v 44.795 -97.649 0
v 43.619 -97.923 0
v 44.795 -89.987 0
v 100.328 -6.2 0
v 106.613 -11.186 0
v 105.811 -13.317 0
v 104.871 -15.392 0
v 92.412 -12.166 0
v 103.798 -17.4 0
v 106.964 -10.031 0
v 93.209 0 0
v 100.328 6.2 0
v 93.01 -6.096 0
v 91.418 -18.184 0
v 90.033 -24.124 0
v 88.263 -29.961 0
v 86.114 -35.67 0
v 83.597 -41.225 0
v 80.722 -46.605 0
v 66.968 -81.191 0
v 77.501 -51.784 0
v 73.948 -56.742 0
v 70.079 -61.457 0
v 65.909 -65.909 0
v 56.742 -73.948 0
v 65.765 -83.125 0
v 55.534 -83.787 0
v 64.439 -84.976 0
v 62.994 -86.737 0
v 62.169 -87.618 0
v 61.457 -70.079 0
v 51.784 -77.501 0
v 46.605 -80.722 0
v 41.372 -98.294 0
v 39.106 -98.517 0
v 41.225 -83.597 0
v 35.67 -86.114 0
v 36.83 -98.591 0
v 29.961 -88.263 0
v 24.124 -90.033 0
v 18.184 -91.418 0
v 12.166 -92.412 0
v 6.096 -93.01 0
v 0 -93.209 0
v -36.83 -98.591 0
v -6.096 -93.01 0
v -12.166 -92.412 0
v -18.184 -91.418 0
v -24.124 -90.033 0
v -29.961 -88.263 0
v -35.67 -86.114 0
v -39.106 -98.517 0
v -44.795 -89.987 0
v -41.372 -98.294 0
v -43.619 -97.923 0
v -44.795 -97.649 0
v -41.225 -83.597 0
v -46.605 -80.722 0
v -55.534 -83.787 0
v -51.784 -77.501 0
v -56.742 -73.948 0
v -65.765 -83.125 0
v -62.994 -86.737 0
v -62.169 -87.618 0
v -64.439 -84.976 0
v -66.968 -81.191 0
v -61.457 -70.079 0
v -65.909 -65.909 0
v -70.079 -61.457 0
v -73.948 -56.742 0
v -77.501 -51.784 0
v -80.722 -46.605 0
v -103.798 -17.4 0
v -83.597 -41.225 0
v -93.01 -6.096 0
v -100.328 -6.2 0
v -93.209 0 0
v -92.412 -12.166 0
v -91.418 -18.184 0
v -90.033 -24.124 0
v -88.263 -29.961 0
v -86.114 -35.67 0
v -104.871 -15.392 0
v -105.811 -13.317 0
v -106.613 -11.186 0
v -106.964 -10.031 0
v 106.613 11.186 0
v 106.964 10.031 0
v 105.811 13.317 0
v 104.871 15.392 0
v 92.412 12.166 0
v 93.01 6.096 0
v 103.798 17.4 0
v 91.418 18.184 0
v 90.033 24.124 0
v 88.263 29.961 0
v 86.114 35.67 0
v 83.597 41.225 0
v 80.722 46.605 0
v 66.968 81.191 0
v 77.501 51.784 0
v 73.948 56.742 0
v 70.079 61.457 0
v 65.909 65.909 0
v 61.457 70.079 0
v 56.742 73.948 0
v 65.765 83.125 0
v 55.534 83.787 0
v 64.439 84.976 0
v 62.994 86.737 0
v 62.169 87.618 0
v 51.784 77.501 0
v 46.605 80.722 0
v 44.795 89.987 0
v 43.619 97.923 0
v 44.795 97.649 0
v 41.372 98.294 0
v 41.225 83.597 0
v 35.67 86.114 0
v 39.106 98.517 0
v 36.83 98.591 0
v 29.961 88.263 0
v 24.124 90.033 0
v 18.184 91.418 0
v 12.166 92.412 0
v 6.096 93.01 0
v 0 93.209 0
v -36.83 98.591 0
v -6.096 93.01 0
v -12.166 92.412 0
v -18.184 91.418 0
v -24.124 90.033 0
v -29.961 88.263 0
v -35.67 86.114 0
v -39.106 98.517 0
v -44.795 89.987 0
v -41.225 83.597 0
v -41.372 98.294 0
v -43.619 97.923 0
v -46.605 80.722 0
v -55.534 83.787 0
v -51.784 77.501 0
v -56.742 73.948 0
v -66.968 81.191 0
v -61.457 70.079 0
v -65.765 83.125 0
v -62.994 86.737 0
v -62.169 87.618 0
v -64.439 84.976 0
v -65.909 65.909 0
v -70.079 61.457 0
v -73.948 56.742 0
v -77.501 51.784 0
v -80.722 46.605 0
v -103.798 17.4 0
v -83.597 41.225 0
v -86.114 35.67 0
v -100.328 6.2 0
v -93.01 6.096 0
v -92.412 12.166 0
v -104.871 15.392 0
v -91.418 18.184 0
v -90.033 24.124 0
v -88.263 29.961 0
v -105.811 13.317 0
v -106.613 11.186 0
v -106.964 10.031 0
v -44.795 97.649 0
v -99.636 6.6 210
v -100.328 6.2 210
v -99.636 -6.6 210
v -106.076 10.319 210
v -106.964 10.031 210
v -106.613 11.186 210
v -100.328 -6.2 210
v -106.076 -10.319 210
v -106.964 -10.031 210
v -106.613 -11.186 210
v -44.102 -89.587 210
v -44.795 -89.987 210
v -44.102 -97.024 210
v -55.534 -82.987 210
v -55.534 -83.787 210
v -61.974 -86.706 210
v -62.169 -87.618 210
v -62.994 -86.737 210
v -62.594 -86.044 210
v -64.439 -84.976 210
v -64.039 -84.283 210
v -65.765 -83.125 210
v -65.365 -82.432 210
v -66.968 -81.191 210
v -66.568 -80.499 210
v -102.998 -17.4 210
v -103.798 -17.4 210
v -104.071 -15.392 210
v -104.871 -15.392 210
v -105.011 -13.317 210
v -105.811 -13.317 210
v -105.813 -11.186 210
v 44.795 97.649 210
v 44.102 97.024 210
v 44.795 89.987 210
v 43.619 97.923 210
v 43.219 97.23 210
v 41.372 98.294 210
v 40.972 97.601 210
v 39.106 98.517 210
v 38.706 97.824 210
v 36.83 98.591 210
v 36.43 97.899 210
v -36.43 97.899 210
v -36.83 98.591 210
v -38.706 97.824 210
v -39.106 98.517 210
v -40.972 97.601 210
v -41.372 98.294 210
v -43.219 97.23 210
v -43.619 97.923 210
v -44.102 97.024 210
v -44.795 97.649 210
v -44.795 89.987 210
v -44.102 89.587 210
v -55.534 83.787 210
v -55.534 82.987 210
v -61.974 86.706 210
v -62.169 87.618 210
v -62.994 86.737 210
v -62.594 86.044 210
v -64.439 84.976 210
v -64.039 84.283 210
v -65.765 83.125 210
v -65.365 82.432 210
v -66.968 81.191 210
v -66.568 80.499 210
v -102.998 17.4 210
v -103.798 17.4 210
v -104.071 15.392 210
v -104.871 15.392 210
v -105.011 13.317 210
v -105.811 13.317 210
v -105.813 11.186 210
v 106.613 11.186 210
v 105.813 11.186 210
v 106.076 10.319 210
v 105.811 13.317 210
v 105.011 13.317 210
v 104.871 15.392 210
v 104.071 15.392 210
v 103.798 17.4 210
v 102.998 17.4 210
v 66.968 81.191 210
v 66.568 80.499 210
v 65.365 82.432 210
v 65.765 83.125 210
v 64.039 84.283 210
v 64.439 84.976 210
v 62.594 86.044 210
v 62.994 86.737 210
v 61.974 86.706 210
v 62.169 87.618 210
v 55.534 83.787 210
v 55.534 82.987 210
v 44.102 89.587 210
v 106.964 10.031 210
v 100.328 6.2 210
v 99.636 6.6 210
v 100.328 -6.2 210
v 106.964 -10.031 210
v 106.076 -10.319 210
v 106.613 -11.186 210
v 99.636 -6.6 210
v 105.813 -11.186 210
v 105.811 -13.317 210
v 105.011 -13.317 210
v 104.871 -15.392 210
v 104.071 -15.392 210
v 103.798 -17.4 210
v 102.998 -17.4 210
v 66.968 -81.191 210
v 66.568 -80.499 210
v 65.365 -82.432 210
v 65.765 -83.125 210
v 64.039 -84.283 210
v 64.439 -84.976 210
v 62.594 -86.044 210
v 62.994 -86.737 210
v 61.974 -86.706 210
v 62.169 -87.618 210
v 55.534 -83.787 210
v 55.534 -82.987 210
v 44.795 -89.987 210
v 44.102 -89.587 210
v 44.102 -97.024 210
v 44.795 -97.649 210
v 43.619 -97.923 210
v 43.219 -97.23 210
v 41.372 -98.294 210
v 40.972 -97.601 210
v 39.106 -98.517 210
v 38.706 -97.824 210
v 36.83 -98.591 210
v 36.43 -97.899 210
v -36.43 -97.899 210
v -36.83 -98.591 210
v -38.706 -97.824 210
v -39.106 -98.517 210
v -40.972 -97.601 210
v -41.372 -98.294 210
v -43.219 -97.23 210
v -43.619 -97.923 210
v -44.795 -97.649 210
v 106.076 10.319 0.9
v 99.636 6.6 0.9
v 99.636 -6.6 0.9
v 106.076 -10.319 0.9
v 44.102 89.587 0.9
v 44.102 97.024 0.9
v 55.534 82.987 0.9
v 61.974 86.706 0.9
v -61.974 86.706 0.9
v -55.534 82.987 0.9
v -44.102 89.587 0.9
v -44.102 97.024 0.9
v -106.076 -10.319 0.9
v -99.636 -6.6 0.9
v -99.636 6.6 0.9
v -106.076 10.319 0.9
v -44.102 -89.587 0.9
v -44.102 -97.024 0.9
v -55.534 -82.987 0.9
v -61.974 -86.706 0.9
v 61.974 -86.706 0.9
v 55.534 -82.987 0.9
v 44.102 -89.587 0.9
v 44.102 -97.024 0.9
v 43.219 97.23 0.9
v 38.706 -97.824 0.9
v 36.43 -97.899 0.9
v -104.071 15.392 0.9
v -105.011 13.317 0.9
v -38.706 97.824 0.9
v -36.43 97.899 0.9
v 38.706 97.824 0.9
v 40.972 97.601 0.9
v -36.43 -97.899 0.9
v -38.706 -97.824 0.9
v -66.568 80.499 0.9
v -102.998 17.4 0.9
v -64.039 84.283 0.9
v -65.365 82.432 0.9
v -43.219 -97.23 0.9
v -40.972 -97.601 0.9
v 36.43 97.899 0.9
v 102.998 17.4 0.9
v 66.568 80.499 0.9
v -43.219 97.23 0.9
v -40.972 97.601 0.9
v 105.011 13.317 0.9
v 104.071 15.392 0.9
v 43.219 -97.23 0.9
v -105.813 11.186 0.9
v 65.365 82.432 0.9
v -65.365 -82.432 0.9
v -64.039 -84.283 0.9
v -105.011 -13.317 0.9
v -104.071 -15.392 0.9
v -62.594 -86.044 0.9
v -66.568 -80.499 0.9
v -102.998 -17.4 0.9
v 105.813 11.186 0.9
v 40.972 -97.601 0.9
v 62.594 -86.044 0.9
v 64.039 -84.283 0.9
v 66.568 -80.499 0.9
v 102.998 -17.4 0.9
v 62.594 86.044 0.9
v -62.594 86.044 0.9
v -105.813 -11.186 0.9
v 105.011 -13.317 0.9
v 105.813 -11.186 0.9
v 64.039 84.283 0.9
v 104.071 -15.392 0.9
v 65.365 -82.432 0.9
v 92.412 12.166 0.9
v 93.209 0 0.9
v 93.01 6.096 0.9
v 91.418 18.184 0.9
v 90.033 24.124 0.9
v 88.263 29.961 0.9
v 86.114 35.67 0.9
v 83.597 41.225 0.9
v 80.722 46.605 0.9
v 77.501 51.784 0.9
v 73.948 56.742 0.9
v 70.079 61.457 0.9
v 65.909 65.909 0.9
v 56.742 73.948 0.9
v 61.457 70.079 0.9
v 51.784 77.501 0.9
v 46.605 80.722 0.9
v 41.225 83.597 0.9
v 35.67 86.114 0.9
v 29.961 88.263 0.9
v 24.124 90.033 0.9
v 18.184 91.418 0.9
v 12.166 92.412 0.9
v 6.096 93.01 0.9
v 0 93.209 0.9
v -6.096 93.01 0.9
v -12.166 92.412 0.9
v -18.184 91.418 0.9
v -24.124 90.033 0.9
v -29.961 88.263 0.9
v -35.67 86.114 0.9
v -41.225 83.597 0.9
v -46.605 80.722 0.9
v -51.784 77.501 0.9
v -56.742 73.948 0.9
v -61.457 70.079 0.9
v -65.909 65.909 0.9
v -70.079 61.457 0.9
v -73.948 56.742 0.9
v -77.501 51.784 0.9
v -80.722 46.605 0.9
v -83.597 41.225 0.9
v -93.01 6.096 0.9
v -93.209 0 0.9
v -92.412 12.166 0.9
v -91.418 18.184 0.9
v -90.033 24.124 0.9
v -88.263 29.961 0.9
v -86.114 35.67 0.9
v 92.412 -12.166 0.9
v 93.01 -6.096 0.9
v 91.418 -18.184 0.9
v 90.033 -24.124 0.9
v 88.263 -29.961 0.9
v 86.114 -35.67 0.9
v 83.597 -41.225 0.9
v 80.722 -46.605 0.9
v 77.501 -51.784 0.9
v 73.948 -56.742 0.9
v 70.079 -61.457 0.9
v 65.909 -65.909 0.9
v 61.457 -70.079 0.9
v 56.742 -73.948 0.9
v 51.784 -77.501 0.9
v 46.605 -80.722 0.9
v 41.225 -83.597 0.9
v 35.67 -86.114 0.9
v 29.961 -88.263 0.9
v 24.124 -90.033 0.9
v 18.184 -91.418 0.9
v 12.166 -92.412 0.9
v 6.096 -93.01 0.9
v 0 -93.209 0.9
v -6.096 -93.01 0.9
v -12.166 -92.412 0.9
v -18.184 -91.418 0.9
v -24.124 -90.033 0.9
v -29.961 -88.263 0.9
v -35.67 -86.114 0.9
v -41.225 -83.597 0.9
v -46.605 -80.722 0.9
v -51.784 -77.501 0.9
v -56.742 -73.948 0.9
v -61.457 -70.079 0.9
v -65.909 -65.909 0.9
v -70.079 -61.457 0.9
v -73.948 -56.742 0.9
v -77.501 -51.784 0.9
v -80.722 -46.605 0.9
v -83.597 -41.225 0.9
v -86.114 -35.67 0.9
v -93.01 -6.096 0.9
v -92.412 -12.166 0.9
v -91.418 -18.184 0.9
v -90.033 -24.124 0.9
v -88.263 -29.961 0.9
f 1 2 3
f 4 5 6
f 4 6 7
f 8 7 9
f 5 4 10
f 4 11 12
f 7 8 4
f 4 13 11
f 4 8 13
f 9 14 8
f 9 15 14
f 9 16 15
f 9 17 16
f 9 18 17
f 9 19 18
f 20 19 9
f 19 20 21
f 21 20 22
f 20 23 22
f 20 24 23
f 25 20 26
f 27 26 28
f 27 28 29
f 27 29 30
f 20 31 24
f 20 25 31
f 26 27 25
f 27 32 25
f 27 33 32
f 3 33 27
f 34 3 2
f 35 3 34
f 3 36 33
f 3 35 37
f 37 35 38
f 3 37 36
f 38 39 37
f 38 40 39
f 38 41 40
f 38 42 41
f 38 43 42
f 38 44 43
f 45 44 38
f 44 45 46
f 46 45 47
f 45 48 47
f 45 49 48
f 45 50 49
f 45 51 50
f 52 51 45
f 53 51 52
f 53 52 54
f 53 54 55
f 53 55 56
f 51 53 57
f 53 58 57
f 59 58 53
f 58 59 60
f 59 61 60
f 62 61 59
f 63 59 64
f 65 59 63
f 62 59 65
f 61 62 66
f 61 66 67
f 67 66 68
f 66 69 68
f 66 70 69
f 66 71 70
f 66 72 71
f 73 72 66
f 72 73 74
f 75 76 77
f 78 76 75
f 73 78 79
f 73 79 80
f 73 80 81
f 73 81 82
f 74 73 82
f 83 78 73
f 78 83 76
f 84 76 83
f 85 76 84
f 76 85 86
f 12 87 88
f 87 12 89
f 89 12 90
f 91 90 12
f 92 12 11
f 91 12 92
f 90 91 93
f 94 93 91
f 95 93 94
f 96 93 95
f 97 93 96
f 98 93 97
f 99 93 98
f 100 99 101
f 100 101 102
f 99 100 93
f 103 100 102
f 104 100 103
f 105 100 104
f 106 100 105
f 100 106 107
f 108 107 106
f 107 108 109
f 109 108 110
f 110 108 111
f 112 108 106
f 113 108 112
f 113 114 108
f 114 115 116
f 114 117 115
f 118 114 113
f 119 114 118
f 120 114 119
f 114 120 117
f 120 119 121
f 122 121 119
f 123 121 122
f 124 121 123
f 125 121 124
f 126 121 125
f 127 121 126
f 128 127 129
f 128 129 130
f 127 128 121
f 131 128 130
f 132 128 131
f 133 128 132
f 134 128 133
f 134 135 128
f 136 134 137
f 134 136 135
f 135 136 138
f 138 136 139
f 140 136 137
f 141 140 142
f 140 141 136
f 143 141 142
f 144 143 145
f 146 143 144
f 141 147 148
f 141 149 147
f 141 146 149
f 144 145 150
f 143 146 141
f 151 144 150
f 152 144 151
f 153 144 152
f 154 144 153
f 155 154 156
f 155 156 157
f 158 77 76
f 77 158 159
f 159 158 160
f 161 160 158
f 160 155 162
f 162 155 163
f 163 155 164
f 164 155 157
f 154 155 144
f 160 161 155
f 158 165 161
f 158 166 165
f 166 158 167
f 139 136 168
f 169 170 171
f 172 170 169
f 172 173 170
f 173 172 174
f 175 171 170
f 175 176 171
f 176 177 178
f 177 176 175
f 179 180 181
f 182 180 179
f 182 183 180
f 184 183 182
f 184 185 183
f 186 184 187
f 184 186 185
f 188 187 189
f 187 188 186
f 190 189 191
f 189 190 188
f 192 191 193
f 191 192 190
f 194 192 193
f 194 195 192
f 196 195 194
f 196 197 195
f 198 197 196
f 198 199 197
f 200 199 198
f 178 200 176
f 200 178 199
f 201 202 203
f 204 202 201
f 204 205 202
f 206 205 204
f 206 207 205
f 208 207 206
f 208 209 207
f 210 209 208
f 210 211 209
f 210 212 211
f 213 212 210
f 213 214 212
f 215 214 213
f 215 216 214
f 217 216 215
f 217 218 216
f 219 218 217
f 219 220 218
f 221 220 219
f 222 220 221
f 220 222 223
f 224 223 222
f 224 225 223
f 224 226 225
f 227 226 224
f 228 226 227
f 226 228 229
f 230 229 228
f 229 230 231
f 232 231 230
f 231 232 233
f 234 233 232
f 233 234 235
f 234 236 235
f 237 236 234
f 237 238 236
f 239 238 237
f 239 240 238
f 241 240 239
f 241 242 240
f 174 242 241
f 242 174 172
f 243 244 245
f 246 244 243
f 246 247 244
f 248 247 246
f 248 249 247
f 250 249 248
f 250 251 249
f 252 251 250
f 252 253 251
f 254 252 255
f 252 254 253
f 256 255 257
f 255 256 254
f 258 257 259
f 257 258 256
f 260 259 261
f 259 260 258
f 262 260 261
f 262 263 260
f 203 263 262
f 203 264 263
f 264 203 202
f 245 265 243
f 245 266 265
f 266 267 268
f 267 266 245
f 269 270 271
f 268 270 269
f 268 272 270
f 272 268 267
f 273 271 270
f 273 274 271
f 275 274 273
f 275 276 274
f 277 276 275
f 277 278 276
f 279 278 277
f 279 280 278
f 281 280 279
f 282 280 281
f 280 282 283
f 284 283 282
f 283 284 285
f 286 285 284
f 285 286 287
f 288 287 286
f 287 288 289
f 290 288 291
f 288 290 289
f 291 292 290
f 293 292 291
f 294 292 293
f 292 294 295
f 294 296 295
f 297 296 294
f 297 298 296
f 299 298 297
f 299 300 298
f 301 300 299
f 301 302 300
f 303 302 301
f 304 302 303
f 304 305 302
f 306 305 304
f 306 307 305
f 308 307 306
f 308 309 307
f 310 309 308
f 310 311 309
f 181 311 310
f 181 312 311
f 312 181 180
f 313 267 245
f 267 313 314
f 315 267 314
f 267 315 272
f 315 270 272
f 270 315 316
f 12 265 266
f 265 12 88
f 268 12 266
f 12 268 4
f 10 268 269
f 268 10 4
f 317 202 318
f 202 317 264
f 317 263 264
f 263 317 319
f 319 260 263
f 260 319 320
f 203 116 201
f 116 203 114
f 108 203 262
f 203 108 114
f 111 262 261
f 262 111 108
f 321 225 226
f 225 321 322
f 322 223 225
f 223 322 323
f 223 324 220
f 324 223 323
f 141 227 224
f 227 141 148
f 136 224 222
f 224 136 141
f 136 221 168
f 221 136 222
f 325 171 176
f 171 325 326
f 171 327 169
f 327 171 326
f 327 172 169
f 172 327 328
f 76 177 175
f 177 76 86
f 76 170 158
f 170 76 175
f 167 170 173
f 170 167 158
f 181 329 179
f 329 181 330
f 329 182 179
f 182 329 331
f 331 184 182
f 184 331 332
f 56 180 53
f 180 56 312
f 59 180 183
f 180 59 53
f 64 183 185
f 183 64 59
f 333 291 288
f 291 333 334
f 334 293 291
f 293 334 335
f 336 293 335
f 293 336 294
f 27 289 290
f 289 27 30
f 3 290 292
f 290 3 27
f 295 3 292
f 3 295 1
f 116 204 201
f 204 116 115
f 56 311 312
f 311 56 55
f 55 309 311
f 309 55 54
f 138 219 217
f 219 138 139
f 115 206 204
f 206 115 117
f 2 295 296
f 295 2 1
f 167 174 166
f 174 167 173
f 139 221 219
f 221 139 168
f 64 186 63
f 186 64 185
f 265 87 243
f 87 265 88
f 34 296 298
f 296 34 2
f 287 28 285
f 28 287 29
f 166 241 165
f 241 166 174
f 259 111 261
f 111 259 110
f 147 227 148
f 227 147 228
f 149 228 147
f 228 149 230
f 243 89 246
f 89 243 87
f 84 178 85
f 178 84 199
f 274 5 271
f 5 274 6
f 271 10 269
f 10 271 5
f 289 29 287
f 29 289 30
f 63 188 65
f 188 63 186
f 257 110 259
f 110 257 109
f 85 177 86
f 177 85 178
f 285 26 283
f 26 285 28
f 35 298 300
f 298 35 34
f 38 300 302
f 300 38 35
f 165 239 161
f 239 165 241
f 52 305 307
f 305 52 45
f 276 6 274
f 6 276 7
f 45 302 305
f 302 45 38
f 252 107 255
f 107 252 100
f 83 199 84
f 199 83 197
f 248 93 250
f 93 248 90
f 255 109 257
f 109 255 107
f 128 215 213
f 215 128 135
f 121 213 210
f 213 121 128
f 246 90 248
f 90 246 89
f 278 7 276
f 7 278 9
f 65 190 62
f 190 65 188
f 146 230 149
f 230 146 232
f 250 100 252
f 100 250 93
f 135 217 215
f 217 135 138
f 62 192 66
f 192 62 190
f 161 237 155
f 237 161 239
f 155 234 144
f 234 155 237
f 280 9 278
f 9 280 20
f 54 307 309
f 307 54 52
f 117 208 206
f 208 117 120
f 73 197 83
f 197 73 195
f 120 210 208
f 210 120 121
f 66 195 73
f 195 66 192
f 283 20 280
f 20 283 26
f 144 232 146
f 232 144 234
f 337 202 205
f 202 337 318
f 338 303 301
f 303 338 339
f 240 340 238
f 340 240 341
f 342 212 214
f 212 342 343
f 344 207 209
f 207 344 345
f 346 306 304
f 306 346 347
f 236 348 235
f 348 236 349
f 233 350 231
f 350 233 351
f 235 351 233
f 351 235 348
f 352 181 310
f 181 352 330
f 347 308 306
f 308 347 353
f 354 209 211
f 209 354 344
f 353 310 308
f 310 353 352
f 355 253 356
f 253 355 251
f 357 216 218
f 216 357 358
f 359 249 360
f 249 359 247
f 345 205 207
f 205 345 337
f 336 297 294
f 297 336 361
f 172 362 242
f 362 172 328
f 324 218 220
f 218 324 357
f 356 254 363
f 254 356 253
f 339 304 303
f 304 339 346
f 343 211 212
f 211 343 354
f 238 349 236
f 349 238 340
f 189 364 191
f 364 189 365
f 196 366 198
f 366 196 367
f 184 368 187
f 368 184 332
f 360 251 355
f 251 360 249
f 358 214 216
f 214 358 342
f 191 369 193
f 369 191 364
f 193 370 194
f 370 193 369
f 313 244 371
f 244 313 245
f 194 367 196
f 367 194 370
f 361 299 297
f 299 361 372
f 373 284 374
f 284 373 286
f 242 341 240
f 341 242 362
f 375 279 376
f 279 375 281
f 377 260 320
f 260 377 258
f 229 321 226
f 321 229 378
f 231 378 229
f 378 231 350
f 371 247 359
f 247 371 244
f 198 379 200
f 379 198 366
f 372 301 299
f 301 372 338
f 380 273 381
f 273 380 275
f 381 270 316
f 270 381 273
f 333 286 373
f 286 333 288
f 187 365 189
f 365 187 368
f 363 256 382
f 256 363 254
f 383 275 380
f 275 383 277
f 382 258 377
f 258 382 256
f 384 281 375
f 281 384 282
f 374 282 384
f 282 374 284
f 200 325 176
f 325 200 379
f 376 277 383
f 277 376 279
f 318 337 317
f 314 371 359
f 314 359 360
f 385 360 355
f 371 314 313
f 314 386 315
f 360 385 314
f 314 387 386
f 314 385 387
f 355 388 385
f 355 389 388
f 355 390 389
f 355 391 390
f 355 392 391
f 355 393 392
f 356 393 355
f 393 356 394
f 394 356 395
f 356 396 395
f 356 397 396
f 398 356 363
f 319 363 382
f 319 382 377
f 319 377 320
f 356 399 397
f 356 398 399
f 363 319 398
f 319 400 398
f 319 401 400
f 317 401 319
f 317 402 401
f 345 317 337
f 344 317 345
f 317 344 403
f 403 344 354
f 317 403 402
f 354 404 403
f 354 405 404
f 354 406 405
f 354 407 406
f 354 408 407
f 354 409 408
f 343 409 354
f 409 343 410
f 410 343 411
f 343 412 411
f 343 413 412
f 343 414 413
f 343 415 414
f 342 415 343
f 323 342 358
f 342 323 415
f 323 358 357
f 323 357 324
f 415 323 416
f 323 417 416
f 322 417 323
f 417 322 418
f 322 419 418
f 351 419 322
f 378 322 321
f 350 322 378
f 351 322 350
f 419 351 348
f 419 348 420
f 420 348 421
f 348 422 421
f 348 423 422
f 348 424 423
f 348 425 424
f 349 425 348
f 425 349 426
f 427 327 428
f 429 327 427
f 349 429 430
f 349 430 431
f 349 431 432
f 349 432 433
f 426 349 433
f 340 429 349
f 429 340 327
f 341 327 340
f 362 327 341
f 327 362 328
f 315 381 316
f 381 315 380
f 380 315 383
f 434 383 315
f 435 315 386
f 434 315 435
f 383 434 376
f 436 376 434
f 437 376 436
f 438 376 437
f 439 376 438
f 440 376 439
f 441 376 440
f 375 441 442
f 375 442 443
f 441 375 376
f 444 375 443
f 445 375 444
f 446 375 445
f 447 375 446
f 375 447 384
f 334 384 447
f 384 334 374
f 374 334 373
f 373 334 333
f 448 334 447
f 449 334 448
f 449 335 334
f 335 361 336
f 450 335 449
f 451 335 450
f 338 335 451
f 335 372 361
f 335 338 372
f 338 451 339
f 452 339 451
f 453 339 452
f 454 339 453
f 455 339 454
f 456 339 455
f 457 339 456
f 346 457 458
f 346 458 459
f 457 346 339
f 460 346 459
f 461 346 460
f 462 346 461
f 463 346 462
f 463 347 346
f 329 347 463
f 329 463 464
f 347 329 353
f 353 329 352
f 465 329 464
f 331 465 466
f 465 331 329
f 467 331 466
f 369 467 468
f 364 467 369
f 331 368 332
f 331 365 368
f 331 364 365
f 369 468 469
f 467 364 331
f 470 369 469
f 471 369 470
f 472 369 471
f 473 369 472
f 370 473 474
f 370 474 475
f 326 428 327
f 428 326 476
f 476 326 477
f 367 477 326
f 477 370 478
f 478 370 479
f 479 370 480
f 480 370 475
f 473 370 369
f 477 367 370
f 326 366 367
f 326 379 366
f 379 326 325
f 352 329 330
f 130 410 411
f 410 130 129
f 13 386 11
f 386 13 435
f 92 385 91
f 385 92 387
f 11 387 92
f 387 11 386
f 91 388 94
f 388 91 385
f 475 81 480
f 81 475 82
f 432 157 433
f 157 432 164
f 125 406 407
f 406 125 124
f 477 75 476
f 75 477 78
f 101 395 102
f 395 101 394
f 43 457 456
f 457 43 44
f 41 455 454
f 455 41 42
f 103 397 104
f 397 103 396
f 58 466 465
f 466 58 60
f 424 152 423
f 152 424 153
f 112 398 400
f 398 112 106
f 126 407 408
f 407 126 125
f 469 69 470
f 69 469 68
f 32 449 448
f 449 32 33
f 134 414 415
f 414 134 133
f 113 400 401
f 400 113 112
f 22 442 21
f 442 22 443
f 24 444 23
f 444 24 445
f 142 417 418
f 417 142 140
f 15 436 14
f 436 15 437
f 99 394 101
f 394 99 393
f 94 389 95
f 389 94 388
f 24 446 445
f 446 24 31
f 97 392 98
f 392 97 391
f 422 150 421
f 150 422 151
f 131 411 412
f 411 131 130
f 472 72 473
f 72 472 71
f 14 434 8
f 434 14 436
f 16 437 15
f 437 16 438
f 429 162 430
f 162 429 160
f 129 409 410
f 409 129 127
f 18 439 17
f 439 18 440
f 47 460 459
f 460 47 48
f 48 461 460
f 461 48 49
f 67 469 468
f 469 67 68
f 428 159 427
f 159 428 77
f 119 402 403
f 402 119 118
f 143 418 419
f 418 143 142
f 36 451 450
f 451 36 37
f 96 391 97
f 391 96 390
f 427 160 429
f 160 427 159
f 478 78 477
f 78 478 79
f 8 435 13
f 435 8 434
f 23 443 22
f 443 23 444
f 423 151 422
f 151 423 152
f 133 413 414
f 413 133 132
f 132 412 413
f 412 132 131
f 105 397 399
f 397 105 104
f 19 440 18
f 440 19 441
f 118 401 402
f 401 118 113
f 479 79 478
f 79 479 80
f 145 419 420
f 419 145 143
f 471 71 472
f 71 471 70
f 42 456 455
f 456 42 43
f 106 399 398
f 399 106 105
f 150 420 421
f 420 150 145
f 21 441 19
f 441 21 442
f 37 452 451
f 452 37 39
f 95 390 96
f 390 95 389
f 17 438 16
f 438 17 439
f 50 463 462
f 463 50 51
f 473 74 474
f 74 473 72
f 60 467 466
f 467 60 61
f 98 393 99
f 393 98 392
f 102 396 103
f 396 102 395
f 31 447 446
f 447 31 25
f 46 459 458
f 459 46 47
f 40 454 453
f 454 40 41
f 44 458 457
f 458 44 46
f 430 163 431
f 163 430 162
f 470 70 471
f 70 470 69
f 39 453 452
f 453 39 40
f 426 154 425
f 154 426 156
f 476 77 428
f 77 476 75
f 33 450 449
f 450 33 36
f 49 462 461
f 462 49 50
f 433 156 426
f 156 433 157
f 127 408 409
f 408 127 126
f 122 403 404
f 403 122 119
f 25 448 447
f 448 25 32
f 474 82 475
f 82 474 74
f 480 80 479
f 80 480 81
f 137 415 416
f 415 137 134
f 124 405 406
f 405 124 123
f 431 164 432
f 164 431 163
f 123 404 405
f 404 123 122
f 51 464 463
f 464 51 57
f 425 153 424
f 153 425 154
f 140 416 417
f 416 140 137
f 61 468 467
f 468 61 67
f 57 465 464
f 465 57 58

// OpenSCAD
// file: printer-params.scad
d_nozzle = 0.8;
h_layer = 0.15;
z_limit = 210;
y_limit = 210;
// file: helper-functions.scad
// mirrors object and retains copy of original object
module mirror_copy() {
    children(); // Original object
    mirror(v) children(); // Mirrored object
}

// isometric grid for drain mesh
// implemented as 3x rectilinear grid patterns stacked on top of each other and rotated 60 degrees apart
module isometric_grid_generator(r=30, w=0.8, h_layer=0.2, h_bottom_shell=3*0.2, n=6, d_hole=1.2) {
    n_bottom_shell = h_bottom_shell/h_layer;
    rotate([0, 0, 30])
    for (i = [0:1:n_bottom_shell-1]) {
        translate([0, 0, i*h_layer])
        rotate([0, 0, i*60])
        rectilinear_grid_generator(r=r, w=w, h=h_layer, n=n, d_hole=d_hole);
    }
}

// used for generating isometric grid
module rectilinear_grid_generator(r=30, w=0.8, h=0.2, n=3, d_hole=1.2) {
    difference() {
        rotate([0, 0, 90])
        cylinder(h, r=r, $fn=n);
        mirror_copy()
        for (i = [0: w+d_hole: 2*r]) {
            translate([i, 0, h/2])
            cube([d_hole, 2*r, h], center=true);
        }
    }
}

// for generating drain mesh
module honeycomb_generator(n=5, r_hex=0.8, r_dist=1.6, h=0.2) {
    angle=60;
    for (i = [1:1:6]) {
        if (angle*i % angle == 0 && n > 0) {
            rotate([0, 0, angle*i])
            translate([0, r_dist*n, 0])
            cylinder(r=r_hex, h=h, $fn=6);
        }
        if (n % 2 == 0) {
            rotate([0, 0, angle*i])
            translate([r_dist*n*1.5/sqrt(3), 0, 0])
            cylinder(r=r_hex, h=h, $fn=6);
        }
        if (n % 2 == 0 && n > 3) {
            for (j = [-(n-2):2:(n-2)]) {
                rotate([0, 0, angle*i])
                translate([r_dist*n*1.5/sqrt(3), j*r_dist/2, 0])
                cylinder(r=r_hex, h=h, $fn=6);
            }
        }
        if (n % 2 != 0 && n > 2) {
            for (j = [-(n-2):2:(n-2)]) {
                rotate([0, 0, angle*i])
                translate([r_dist*n*1.5/sqrt(3), j*r_dist/2, 0])
                cylinder(r=r_hex, h=h, $fn=6);
            }
        }
    }
    if (n > 0) {
        honeycomb_generator(n=n-1, r_hex=r_hex, r_dist=r_dist, h=h);
    }
}

// water injection port cavity
module water_injection_port_cavity(r, h) {
    rotate([0, 0, 30])
    cylinder(r=r, h=h, $fn=6);
    for (i = [-1:2:1]) {
        rotate([0, 0, 30*i])
        translate([sqrt(3)*r/2, 0, 0])
        cylinder(r=r, h=h, $fn=6);
    }
}

// water injection port walls
module water_injection_port(r_o, r_i, h) {
    difference() {
        union() {
            rotate([0, 0, 30])
            cylinder(r=r_o, h=h, $fn=6);
            for (i = [-1:2:1]) {
                rotate([0, 0, 30*i])
                translate([sqrt(3)*r_o/4, 0, 0])
                cylinder(r=r_o, h=h, $fn=6);
            }
        }

        // water injection port cavity
        water_injection_port_cavity(r_i, h);
    }
}

// shell used to remove protruding water injection port walls
module invisible_shell(r_o, r_i, h, r_fil=0) {
    difference() {
        linear_extrude(h)
        rounding2d(r_fil)
        hexagon2d(r=r_o);

        linear_extrude(h)
        rounding2d(r_fil)
        hexagon2d(r=r_i);
    }
}

// hexagon function
module equilateraltriangle2d(r) {
    polygon(points=[[-r, 0], [0, r*sqrt(3)], [r, 0]]);
}

// hexagon function
module hexagon2d(r) {
    polygon(points=[[r, 0], [r/2, r*sqrt(3)/2], [-r/2, r*sqrt(3)/2], [-r, 0], [-r/2, -r*sqrt(3)/2], [r/2, -r*sqrt(3)/2]]);
}

//// fillet functions

// used for circular filleted cutout of outer bottom
module circular_outer_bottom_fillet(r_cyl, r_fil, h_bottom_offset, res) {
    translate([0, 0, -h_bottom_offset])
    difference() {
        cylinder(h=r_fil, r=r_cyl, $fn=res);

        // remove layers that would otherwise print steep overhangs due to fillet
        cylinder(h=h_bottom_offset, r=r_cyl);

        bottomFillet(b=0, r=r_fil, s=200)
        cylinder(h=r_fil, r=r_cyl, $fn=res);
    }
}

// based on work by https://github.com/ademuri/openscad-fillets

function filletDepth(r, d, i) = r * cos(asin(d * i / r));

module topBottomFillet(b = 0, t = 2, r = 1, s = 4, e = 1) {
    if (e == 1) {
        topFilletPeice(t = t, r = r, s = s) children(0);
        bottomFilletPeice(b = b, r = r, s = s) children(0);

        render()
        difference() {
            children(0);

            translate([0, 0, t - r])
            linear_extrude(r + 1)
            offset(delta = 1e5)
            projection()
            children(0);

            translate([0, 0, b - 1])
            linear_extrude(r + 1)
            offset(delta = 1e5)
            projection()
            children(0);

        }
    }
    if (e == 0) children(0);
}

module topFillet(t = 2, r = 1, s = 4, e = 1) {
    if (e == 1) {
        topFilletPeice(t = t, r = r, s = s) children(0);

        render()
        difference() {
            children(0);
            translate([0, 0, t-r])
            linear_extrude(r + 1)
            offset(delta = 1e5)
            projection()
            children(0);
        }
    }
    if (e == 0) children(0);
}

module bottomFillet(b = 0, r = 1, s = 4, e = 1) {
    if (e == 1) {
        bottomFilletPeice(b = b, r = r, s = s) children(0);

        render()
        difference() {
            children(0);
            translate([0, 0, b - 1])
            linear_extrude(r + 1)
            offset(delta = 1e5)
            projection()
            children(0);
        }
    }
    if (e == 0) children(0);
}

module topFilletPeice(t = 2, r = 1, s = 4) {
    d = r/s;

    for (i = [0:s]) {
        x = filletDepth(r, d, i);
        z = d * (s - i + 1);
        translate([0, 0, t - z])
        linear_extrude(d)
        offset(delta = -r + x)
        projection(true)
        translate([0, 0, -t + z])
        children(0);
    }
}

module bottomFilletPeice(b = 0, r =1, s = 4) {
    d = r/s;

    for (i = [0:s]) {
        x = filletDepth(r, d, i);
        z = d * (s - i);
        translate([0, 0, b + z])
        linear_extrude(d)
        offset(delta = -r + x)
        projection(true)
        translate([0, 0, b - z])
        children(0);
    }
}

module rounding2d(r) {
    offset(r = r) offset(delta = -r) children(0);
}
// file: design-params.scad
// printer parameters
include <printer-params.scad>

// design parameters
scale_factor = 1.0;

t_wall = d_nozzle;
t_wall_clearance = d_nozzle;

perimeter_buffer = 10;

d_buoy = (2*y_limit/sqrt(3) - perimeter_buffer)*scale_factor;
d_i_buoy = sqrt(3)*d_buoy/2;
h_buoy = z_limit*scale_factor;

d_drain_pipe = (y_limit - perimeter_buffer)*scale_factor/5;
h_drain_pipe = 2*h_buoy/3;

overhang_angle = 60;
d_buoy_cavity = d_buoy-4*t_wall;
h_conical_cavity = tan(90-overhang_angle)*(d_buoy_cavity/2-d_drain_pipe/2);
h_bottom_shell = 6*h_layer;

d_planter = d_buoy_cavity-2*t_wall_clearance;
d_planter_cavity = d_planter-2*t_wall;

d_water_injection_port_cavity_buoy = 20;
d_water_injection_port_buoy = d_water_injection_port_cavity_buoy + 4*t_wall;
x_water_injection_port = d_buoy/2-(d_water_injection_port_cavity_buoy/2)*sin(30)/sin(75);

d_drain_hole=3*d_nozzle;
r_drain_hole_dist = 3*d_drain_hole;
d_wicking_chamber_short_base = d_planter/3;

r_fillet = 1.5*d_water_injection_port_buoy*scale_factor;
h_bottom_fillet_offset = 0.05*r_fillet;
// main file
// design parameters
include <design-params.scad>
include <helper-functions.scad>

d_wicking_plate = d_buoy_cavity-2*t_wall_clearance;
d_water_injection_port_cavity_wicking_plate = d_water_injection_port_buoy;
h_planter = z_limit*scale_factor;
d_drainpipe = 4*d_nozzle;

d_water_injection_port_cavity_planter = d_water_injection_port_buoy;

d_water_injection_port_planter = d_water_injection_port_cavity_planter+2*t_wall;

d_interface_rim = d_planter_cavity - d_water_injection_port_buoy*sqrt(3)/2 - (d_water_injection_port_cavity_buoy/2)*sin(30)/sin(75) - 2*t_wall;

// Hidden variables:
res_fil = 96;
$fn = res_fil;

// water injection port walls
difference() {
    // water injection port walls
    for (i = [0:1:6]) {
        rotate([0, 0, 60*i])
        translate([x_water_injection_port, 0, 0])
        water_injection_port(r_o=d_water_injection_port_planter/2+t_wall, r_i=d_water_injection_port_cavity_planter/2+t_wall, h=h_buoy);
    }

    // shell used to remove protruding water injection port walls
    invisible_shell(r_o=d_buoy/2+d_water_injection_port_planter, r_i=d_planter/2, h=z_limit, r_fil=r_fillet);
}

// planter walls
difference() {
    linear_extrude(h_planter)
    rounding2d(r_fillet)
    hexagon2d(r=d_planter/2);

    // water injection port cavity
    for (i = [0:1:6]) {
        rotate([0, 0, 60*i])
        translate([x_water_injection_port, 0, 0])
        water_injection_port_cavity(r=d_water_injection_port_cavity_planter/2+t_wall, h=z_limit);
    }

    // hexagonal cavity
    linear_extrude(h_planter)
    rounding2d(r_fillet)
    hexagon2d(r=d_planter_cavity/2);

    // hexagonal cavity for drainpipe
    linear_extrude(h_bottom_shell)
    hexagon2d(r=d_drainpipe/2);
}

// planter brim
difference() {
    linear_extrude(h_bottom_shell)
    rounding2d(r_fillet)
    hexagon2d(r=d_planter/2);

    // water injection port cavity
    for (i = [0:1:6]) {
        rotate([0, 0, 60*i])
        translate([x_water_injection_port, 0, 0])
        water_injection_port_cavity(r=d_water_injection_port_cavity_planter/2+t_wall, h=z_limit);
    }

    // hexagonal cavity
    linear_extrude(h_planter)
    rounding2d(r_fillet)
    hexagon2d(r=d_planter_cavity/2-sqrt(3)*d_drain_hole/2);
}

// water injection port brim
difference() {
    // water injection port walls
    for (i = [0:1:6]) {
        rotate([0, 0, 60*i])
        translate([x_water_injection_port, 0, 0])
        water_injection_port(r_o=d_water_injection_port_planter/2+d_drain_hole, r_i=d_water_injection_port_cavity_planter/2+t_wall, h=h_bottom_shell);
    }

    // shell used to remove protruding water injection port walls
    invisible_shell(r_o=d_buoy/2+d_water_injection_port_planter, r_i=d_planter/2, h=z_limit, r_fil=r_fillet);
}


// drain mesh
difference() {
    // drain mesh
    linear_extrude(h_bottom_shell)
    rounding2d(r_fillet)
    hexagon2d(r=d_planter/2);

    // water injection port cavity
    for (i = [0:1:6]) {
        rotate([0, 0, 60*i])
        translate([x_water_injection_port, 0, 0])
        water_injection_port_cavity(r=d_water_injection_port_cavity_planter/2+t_wall, h=z_limit);
    }

    // drain mesh interface
    cylinder(r=d_interface_rim/2 - 8*t_wall, h=2*h_bottom_shell, $fn=96);
}
